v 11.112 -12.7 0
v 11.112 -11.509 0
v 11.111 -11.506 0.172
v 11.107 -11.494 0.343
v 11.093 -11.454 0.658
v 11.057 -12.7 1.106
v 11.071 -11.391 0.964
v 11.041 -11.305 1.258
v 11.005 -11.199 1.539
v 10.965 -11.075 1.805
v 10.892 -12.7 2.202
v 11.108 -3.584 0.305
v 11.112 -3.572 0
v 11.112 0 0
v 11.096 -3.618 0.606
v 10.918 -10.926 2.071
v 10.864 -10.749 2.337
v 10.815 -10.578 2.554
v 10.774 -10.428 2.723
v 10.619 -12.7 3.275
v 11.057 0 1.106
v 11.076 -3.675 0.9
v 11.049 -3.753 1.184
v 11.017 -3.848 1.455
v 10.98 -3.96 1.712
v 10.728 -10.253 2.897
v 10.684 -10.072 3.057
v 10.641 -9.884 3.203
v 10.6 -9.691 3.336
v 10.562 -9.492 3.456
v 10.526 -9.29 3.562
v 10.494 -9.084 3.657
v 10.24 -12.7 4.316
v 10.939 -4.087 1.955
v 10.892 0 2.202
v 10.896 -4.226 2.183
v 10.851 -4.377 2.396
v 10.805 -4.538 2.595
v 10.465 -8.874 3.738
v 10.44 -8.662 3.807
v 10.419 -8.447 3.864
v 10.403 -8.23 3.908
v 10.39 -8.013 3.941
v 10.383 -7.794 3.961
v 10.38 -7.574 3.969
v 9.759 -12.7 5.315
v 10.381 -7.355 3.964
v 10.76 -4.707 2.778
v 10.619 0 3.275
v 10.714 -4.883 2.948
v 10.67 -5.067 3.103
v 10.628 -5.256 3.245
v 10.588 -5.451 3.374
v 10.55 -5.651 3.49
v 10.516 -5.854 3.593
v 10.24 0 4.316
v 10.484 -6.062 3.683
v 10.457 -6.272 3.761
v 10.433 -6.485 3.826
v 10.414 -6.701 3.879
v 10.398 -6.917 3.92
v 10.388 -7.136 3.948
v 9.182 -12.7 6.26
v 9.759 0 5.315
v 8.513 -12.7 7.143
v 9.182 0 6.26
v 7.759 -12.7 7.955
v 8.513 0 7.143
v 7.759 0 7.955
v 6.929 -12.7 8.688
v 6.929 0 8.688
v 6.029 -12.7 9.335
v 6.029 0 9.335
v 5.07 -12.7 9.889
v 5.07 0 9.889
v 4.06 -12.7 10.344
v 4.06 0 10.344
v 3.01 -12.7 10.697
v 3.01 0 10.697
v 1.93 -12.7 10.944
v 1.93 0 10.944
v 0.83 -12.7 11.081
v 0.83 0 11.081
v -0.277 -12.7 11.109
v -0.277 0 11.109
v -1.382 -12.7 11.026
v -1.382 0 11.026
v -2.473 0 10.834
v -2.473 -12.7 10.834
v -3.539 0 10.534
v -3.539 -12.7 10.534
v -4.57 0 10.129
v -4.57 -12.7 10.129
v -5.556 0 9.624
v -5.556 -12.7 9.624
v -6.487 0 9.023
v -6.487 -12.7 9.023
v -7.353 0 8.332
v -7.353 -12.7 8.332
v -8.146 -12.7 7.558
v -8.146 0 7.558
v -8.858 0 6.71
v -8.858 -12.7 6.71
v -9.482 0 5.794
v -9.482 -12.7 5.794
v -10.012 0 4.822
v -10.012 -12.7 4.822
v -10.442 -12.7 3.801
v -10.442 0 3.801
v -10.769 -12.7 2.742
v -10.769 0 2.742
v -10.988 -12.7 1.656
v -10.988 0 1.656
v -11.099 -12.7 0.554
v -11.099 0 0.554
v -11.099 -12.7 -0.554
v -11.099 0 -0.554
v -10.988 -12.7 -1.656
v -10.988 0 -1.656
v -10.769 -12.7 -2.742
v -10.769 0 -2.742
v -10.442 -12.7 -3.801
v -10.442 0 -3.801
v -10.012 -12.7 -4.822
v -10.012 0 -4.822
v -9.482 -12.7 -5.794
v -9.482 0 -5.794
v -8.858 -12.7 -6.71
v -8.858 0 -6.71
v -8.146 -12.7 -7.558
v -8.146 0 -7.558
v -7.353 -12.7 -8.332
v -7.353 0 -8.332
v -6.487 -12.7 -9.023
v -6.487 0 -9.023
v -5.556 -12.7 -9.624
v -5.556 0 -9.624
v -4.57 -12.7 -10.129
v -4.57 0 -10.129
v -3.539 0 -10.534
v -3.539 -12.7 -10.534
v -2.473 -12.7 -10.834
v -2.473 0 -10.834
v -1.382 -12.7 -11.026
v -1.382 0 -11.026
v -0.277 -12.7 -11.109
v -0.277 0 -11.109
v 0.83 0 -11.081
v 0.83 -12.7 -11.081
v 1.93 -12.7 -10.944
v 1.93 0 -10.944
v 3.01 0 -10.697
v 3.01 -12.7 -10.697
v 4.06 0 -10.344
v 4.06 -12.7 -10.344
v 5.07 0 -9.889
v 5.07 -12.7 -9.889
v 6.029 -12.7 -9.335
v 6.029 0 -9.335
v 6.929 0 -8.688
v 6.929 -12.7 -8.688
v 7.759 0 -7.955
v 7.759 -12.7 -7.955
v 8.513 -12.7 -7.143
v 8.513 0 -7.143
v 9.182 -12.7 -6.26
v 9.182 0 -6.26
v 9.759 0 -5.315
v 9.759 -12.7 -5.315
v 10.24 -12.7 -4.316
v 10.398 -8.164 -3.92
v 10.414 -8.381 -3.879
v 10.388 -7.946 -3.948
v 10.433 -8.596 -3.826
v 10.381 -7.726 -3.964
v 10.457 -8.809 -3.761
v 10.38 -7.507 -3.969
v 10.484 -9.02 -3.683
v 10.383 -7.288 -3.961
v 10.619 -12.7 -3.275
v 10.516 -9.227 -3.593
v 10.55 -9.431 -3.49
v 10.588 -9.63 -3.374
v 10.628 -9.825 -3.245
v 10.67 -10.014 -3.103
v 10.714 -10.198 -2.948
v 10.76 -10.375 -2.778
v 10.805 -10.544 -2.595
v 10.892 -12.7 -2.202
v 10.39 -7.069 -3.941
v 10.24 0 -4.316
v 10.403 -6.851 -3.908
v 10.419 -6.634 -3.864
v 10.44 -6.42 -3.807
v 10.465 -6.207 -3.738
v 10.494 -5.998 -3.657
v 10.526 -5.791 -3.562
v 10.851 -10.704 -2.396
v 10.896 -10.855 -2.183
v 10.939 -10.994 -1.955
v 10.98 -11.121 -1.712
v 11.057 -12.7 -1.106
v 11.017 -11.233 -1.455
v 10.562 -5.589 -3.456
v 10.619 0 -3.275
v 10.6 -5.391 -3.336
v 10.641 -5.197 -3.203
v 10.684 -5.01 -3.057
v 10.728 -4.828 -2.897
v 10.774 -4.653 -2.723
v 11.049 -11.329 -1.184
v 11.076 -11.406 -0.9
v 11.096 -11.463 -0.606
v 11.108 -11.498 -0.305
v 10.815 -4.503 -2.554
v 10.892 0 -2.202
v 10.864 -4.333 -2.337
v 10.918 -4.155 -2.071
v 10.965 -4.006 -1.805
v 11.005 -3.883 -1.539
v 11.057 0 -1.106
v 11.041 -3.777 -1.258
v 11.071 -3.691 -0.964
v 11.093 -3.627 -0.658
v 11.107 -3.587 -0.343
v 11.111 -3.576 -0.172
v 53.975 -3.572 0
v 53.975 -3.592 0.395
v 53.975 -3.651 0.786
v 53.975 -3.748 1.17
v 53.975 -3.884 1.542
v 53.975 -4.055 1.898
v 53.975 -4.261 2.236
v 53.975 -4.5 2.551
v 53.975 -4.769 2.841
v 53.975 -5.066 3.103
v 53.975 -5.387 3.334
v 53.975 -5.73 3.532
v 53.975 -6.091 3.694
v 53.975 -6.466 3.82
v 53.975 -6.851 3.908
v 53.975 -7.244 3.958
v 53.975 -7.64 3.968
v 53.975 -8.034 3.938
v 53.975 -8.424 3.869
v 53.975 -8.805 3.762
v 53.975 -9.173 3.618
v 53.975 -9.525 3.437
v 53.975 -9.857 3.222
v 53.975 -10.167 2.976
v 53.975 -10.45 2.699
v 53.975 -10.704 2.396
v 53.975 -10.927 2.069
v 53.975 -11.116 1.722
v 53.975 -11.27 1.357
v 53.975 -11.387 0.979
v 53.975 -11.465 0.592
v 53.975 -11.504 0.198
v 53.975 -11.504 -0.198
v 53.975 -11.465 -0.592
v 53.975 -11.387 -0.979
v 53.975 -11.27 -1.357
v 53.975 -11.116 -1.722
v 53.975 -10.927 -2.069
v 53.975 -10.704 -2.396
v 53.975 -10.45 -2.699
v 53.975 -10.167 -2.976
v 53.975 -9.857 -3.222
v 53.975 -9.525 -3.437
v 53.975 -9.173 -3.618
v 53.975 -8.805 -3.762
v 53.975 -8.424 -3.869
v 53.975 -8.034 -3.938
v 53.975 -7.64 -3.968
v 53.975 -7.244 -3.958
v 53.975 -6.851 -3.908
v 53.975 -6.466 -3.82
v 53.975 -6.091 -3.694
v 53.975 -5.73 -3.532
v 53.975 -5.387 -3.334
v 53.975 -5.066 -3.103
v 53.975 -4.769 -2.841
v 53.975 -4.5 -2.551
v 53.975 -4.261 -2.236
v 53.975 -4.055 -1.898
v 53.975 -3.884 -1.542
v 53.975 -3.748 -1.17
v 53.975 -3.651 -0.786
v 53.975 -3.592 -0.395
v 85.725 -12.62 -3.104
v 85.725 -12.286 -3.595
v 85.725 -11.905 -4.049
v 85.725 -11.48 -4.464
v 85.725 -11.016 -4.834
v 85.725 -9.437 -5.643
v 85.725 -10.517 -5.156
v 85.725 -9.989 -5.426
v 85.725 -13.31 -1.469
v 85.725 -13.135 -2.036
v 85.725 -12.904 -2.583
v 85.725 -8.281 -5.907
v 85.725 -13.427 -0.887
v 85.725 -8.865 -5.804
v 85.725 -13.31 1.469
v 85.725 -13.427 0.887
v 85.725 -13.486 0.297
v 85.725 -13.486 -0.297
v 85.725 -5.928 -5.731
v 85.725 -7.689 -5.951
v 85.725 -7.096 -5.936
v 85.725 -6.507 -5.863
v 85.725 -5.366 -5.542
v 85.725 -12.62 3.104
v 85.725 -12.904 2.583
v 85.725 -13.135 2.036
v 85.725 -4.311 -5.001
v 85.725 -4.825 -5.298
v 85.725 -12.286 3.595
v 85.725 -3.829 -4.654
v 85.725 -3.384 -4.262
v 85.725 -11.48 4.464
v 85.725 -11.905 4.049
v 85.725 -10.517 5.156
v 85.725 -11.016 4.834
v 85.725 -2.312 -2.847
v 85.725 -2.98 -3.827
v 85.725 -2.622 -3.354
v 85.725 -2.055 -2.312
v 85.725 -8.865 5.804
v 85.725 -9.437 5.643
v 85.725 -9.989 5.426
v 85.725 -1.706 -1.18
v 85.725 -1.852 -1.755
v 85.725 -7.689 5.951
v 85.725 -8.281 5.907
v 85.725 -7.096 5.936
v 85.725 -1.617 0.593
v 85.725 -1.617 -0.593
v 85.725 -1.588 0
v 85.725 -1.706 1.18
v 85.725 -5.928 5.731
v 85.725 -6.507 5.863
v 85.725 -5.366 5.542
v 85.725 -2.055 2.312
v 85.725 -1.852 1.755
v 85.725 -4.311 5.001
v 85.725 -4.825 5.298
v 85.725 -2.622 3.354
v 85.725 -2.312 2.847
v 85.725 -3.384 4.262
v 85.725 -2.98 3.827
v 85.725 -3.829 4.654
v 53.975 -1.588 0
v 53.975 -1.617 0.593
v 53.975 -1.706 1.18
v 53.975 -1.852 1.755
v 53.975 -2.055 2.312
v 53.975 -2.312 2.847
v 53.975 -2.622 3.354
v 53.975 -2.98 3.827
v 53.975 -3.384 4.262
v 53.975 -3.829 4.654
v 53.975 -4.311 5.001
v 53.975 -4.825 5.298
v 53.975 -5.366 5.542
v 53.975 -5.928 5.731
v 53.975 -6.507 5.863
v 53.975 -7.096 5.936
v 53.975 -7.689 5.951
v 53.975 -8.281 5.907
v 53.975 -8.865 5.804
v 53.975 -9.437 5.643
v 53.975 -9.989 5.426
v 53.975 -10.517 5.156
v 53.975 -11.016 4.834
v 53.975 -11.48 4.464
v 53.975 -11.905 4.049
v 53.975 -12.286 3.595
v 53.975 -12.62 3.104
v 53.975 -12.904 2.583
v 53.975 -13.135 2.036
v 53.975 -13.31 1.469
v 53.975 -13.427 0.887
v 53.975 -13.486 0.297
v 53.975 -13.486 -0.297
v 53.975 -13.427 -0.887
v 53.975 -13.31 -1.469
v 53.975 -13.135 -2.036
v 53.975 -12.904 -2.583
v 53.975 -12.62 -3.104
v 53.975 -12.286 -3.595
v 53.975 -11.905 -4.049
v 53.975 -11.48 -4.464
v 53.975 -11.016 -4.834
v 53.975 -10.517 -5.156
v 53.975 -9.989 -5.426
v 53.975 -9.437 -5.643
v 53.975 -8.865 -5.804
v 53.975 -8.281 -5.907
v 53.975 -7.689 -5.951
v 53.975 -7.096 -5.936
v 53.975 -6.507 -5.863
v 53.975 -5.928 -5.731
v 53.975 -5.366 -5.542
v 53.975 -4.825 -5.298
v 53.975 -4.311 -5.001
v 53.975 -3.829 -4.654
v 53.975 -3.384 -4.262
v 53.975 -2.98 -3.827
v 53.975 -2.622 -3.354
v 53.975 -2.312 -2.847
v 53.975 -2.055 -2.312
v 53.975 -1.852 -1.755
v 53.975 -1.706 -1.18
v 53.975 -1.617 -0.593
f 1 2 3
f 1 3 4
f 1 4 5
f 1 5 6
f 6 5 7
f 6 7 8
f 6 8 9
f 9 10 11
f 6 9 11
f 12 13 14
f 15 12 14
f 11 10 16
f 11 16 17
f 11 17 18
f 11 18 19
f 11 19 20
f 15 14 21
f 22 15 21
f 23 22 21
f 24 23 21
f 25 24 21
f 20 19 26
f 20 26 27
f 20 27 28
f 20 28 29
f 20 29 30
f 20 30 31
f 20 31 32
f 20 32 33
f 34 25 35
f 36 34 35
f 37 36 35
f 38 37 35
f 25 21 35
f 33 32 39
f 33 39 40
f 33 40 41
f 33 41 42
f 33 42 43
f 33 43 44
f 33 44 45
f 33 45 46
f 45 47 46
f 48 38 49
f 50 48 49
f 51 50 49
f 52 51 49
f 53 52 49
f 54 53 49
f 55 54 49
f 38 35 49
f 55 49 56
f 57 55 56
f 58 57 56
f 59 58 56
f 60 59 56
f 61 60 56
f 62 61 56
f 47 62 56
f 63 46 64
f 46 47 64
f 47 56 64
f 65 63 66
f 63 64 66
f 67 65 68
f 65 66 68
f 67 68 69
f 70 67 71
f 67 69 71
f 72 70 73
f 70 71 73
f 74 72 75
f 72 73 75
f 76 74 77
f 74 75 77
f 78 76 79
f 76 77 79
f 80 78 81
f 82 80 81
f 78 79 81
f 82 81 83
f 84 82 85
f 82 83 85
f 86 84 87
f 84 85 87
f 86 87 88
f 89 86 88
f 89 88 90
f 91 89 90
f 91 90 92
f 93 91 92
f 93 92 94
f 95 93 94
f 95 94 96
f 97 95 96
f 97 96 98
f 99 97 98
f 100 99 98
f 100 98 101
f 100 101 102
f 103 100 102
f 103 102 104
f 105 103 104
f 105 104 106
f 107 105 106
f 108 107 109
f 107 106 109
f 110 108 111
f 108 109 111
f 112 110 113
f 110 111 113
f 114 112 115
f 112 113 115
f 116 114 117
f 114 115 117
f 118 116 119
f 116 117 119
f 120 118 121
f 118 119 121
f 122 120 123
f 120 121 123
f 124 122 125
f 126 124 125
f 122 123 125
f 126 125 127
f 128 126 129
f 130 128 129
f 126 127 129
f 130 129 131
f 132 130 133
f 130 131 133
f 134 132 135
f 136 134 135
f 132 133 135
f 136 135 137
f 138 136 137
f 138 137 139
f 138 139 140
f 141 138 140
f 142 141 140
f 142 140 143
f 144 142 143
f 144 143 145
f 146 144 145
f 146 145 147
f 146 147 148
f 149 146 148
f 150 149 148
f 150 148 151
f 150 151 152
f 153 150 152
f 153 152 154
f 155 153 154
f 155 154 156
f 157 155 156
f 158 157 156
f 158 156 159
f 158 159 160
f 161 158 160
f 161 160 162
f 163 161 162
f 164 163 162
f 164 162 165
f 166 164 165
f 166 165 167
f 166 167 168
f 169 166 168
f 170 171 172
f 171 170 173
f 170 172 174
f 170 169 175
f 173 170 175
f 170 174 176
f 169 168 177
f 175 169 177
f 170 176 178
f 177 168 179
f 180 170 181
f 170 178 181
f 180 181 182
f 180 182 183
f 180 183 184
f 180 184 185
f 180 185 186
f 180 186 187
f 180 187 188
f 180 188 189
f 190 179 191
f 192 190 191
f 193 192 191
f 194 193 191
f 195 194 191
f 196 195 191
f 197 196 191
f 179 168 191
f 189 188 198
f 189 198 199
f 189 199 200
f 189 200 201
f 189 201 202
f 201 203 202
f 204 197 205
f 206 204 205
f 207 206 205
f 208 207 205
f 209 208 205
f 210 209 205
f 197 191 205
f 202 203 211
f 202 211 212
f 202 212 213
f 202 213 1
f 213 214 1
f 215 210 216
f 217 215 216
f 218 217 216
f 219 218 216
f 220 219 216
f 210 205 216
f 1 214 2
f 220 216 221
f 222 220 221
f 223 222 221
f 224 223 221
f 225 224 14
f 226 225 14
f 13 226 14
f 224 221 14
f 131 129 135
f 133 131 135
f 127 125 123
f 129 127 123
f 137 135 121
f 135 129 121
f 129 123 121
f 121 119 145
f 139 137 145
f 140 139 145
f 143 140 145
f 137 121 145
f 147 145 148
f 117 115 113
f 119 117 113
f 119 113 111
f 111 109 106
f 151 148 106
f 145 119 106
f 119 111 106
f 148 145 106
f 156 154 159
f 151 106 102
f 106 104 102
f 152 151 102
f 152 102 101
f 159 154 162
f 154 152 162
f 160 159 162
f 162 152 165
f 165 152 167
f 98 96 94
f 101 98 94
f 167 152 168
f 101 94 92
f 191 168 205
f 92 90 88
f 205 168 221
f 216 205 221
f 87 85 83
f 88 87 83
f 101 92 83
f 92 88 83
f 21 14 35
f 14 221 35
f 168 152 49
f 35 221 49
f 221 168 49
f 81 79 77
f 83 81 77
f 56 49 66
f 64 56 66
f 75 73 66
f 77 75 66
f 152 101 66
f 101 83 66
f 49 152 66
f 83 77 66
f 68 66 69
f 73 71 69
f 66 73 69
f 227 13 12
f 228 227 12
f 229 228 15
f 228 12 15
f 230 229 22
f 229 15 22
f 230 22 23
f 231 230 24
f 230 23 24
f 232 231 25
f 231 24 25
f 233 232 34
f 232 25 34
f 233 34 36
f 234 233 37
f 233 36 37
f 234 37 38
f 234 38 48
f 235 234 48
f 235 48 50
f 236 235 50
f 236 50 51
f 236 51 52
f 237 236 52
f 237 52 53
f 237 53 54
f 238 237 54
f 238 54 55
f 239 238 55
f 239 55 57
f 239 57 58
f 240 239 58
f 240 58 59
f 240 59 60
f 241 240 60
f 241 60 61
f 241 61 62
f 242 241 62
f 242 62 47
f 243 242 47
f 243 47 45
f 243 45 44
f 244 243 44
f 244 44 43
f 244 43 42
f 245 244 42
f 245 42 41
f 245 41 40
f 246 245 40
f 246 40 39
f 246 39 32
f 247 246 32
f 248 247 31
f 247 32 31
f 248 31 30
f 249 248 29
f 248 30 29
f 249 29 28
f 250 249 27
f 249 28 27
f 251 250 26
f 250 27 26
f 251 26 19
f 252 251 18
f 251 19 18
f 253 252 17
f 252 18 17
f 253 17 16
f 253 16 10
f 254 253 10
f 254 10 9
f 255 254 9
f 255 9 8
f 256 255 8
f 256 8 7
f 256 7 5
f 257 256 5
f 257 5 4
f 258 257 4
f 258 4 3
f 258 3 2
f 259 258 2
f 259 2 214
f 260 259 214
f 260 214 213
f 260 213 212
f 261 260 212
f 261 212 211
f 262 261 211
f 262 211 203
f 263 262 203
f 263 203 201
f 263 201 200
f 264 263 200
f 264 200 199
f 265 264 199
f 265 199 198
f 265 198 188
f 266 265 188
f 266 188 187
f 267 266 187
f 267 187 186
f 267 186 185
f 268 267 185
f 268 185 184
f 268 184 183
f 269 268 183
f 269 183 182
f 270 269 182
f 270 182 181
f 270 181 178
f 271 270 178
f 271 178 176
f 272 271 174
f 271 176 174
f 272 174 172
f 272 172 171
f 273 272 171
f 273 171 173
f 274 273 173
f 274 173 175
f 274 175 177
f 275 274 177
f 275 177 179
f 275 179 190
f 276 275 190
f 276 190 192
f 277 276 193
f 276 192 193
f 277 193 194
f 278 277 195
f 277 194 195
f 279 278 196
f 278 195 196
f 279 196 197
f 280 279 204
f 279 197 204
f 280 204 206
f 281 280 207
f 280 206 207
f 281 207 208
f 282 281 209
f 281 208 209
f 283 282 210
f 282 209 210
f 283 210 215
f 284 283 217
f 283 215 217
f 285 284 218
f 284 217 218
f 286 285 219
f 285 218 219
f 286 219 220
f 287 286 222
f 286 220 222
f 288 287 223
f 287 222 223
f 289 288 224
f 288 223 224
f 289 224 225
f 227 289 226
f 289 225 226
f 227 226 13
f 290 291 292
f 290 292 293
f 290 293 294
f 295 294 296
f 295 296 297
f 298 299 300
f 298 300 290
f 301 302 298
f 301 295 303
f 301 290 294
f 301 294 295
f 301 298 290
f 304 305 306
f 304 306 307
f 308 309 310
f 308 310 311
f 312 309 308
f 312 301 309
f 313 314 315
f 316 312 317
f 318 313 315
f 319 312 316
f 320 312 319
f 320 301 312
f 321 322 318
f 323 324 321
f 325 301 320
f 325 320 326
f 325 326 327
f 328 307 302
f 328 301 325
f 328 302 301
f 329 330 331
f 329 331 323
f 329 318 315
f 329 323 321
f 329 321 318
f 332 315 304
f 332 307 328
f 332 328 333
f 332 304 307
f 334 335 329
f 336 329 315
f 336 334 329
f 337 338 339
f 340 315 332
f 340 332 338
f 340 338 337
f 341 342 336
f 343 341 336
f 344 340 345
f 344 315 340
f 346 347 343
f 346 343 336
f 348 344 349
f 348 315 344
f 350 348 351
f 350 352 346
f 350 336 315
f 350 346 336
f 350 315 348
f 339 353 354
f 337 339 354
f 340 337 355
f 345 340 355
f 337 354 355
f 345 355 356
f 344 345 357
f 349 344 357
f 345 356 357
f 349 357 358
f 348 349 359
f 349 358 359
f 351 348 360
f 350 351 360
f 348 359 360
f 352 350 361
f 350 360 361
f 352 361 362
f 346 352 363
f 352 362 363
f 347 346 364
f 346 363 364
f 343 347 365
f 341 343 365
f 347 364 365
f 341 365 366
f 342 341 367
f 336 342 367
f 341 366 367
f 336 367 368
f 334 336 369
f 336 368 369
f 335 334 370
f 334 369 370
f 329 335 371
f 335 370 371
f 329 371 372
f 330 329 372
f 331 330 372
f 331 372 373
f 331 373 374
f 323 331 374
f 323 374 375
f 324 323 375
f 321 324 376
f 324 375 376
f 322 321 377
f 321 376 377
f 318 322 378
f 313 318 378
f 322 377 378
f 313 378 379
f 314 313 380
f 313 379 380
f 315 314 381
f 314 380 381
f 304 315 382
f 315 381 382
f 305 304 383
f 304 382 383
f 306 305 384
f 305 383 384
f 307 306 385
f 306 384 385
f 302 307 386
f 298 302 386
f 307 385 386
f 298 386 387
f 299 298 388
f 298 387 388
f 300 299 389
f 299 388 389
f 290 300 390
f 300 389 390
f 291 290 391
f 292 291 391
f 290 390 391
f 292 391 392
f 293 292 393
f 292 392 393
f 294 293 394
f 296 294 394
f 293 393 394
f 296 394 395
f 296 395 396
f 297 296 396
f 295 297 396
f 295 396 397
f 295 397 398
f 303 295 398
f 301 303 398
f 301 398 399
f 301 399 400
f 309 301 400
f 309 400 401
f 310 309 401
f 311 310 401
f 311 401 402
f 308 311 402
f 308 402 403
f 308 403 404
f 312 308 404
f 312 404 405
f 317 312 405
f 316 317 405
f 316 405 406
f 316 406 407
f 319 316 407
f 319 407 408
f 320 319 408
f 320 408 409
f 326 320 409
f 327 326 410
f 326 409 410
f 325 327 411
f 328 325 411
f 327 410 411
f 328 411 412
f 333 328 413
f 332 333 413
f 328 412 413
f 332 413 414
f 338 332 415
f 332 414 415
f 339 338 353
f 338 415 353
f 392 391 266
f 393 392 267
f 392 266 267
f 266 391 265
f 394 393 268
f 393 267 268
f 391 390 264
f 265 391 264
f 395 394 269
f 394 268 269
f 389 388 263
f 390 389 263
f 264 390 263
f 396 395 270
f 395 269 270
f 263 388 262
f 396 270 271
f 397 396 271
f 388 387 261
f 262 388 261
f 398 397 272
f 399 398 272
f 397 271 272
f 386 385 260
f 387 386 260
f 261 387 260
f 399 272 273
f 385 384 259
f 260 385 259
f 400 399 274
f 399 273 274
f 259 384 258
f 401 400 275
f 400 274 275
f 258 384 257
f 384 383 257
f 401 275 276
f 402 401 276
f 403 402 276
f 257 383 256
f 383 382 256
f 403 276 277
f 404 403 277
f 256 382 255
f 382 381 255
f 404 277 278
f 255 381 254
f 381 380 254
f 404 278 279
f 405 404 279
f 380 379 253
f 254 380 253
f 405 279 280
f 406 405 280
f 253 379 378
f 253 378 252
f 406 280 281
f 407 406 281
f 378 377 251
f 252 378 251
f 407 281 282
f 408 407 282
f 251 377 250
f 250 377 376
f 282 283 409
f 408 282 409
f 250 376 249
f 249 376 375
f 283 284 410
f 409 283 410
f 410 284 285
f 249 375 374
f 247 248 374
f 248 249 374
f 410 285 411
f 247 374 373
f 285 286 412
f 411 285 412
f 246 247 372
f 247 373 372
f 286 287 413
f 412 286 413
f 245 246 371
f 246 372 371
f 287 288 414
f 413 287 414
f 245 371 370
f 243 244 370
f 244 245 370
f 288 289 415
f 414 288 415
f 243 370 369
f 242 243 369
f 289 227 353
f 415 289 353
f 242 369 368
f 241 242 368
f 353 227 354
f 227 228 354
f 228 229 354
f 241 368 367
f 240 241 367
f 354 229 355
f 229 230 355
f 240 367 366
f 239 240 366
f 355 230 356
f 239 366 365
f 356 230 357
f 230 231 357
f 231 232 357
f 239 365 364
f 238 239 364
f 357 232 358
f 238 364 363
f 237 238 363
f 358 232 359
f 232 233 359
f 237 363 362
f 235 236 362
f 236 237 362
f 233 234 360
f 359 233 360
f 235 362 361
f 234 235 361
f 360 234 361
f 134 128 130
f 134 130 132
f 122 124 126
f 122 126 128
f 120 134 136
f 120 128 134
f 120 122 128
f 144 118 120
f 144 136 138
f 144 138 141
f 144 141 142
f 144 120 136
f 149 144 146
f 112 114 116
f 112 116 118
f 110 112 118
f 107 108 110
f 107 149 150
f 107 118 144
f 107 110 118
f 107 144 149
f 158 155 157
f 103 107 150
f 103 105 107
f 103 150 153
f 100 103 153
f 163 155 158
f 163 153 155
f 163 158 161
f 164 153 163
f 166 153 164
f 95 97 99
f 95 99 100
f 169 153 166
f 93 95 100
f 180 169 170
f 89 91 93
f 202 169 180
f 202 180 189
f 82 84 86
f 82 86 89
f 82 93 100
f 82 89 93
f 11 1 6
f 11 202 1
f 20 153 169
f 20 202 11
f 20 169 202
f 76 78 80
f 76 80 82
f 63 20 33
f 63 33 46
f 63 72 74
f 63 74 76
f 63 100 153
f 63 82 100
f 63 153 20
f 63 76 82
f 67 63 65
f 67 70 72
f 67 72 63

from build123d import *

# Parameters (mm, degrees)
F0_R     = 11.1125
F1_DEPTH = 12.7
F2_R     = 3.96875
F3_DEPTH = 53.975
F4_R     = 5.953125
F4_R_2   = 3.96875
F5_DEPTH = 31.75


with BuildPart() as f1:
    # F0 (on Front) → F1 (new body)
    with BuildSketch(Plane.XZ):
        Circle(F0_R)
    extrude(amount=F1_DEPTH)

    # F2 (on Right) → F3 (join)
    with BuildSketch(Plane.YZ):
        with Locations((-7.540625, 0)):
            Circle(F2_R)
    extrude(amount=F3_DEPTH)

    # F4 (on face) → F5 (join)
    with BuildSketch(Plane.YZ.offset(53.975)):
        with Locations((-7.540625, 0)):
            Circle(F4_R)
        with Locations((-7.540625, 0)):
            Circle(F4_R_2, mode=Mode.SUBTRACT)
        with Locations((-7.540625, 0)):
            Circle(F4_R_2)
    extrude(amount=F5_DEPTH)


solid = f1.part
